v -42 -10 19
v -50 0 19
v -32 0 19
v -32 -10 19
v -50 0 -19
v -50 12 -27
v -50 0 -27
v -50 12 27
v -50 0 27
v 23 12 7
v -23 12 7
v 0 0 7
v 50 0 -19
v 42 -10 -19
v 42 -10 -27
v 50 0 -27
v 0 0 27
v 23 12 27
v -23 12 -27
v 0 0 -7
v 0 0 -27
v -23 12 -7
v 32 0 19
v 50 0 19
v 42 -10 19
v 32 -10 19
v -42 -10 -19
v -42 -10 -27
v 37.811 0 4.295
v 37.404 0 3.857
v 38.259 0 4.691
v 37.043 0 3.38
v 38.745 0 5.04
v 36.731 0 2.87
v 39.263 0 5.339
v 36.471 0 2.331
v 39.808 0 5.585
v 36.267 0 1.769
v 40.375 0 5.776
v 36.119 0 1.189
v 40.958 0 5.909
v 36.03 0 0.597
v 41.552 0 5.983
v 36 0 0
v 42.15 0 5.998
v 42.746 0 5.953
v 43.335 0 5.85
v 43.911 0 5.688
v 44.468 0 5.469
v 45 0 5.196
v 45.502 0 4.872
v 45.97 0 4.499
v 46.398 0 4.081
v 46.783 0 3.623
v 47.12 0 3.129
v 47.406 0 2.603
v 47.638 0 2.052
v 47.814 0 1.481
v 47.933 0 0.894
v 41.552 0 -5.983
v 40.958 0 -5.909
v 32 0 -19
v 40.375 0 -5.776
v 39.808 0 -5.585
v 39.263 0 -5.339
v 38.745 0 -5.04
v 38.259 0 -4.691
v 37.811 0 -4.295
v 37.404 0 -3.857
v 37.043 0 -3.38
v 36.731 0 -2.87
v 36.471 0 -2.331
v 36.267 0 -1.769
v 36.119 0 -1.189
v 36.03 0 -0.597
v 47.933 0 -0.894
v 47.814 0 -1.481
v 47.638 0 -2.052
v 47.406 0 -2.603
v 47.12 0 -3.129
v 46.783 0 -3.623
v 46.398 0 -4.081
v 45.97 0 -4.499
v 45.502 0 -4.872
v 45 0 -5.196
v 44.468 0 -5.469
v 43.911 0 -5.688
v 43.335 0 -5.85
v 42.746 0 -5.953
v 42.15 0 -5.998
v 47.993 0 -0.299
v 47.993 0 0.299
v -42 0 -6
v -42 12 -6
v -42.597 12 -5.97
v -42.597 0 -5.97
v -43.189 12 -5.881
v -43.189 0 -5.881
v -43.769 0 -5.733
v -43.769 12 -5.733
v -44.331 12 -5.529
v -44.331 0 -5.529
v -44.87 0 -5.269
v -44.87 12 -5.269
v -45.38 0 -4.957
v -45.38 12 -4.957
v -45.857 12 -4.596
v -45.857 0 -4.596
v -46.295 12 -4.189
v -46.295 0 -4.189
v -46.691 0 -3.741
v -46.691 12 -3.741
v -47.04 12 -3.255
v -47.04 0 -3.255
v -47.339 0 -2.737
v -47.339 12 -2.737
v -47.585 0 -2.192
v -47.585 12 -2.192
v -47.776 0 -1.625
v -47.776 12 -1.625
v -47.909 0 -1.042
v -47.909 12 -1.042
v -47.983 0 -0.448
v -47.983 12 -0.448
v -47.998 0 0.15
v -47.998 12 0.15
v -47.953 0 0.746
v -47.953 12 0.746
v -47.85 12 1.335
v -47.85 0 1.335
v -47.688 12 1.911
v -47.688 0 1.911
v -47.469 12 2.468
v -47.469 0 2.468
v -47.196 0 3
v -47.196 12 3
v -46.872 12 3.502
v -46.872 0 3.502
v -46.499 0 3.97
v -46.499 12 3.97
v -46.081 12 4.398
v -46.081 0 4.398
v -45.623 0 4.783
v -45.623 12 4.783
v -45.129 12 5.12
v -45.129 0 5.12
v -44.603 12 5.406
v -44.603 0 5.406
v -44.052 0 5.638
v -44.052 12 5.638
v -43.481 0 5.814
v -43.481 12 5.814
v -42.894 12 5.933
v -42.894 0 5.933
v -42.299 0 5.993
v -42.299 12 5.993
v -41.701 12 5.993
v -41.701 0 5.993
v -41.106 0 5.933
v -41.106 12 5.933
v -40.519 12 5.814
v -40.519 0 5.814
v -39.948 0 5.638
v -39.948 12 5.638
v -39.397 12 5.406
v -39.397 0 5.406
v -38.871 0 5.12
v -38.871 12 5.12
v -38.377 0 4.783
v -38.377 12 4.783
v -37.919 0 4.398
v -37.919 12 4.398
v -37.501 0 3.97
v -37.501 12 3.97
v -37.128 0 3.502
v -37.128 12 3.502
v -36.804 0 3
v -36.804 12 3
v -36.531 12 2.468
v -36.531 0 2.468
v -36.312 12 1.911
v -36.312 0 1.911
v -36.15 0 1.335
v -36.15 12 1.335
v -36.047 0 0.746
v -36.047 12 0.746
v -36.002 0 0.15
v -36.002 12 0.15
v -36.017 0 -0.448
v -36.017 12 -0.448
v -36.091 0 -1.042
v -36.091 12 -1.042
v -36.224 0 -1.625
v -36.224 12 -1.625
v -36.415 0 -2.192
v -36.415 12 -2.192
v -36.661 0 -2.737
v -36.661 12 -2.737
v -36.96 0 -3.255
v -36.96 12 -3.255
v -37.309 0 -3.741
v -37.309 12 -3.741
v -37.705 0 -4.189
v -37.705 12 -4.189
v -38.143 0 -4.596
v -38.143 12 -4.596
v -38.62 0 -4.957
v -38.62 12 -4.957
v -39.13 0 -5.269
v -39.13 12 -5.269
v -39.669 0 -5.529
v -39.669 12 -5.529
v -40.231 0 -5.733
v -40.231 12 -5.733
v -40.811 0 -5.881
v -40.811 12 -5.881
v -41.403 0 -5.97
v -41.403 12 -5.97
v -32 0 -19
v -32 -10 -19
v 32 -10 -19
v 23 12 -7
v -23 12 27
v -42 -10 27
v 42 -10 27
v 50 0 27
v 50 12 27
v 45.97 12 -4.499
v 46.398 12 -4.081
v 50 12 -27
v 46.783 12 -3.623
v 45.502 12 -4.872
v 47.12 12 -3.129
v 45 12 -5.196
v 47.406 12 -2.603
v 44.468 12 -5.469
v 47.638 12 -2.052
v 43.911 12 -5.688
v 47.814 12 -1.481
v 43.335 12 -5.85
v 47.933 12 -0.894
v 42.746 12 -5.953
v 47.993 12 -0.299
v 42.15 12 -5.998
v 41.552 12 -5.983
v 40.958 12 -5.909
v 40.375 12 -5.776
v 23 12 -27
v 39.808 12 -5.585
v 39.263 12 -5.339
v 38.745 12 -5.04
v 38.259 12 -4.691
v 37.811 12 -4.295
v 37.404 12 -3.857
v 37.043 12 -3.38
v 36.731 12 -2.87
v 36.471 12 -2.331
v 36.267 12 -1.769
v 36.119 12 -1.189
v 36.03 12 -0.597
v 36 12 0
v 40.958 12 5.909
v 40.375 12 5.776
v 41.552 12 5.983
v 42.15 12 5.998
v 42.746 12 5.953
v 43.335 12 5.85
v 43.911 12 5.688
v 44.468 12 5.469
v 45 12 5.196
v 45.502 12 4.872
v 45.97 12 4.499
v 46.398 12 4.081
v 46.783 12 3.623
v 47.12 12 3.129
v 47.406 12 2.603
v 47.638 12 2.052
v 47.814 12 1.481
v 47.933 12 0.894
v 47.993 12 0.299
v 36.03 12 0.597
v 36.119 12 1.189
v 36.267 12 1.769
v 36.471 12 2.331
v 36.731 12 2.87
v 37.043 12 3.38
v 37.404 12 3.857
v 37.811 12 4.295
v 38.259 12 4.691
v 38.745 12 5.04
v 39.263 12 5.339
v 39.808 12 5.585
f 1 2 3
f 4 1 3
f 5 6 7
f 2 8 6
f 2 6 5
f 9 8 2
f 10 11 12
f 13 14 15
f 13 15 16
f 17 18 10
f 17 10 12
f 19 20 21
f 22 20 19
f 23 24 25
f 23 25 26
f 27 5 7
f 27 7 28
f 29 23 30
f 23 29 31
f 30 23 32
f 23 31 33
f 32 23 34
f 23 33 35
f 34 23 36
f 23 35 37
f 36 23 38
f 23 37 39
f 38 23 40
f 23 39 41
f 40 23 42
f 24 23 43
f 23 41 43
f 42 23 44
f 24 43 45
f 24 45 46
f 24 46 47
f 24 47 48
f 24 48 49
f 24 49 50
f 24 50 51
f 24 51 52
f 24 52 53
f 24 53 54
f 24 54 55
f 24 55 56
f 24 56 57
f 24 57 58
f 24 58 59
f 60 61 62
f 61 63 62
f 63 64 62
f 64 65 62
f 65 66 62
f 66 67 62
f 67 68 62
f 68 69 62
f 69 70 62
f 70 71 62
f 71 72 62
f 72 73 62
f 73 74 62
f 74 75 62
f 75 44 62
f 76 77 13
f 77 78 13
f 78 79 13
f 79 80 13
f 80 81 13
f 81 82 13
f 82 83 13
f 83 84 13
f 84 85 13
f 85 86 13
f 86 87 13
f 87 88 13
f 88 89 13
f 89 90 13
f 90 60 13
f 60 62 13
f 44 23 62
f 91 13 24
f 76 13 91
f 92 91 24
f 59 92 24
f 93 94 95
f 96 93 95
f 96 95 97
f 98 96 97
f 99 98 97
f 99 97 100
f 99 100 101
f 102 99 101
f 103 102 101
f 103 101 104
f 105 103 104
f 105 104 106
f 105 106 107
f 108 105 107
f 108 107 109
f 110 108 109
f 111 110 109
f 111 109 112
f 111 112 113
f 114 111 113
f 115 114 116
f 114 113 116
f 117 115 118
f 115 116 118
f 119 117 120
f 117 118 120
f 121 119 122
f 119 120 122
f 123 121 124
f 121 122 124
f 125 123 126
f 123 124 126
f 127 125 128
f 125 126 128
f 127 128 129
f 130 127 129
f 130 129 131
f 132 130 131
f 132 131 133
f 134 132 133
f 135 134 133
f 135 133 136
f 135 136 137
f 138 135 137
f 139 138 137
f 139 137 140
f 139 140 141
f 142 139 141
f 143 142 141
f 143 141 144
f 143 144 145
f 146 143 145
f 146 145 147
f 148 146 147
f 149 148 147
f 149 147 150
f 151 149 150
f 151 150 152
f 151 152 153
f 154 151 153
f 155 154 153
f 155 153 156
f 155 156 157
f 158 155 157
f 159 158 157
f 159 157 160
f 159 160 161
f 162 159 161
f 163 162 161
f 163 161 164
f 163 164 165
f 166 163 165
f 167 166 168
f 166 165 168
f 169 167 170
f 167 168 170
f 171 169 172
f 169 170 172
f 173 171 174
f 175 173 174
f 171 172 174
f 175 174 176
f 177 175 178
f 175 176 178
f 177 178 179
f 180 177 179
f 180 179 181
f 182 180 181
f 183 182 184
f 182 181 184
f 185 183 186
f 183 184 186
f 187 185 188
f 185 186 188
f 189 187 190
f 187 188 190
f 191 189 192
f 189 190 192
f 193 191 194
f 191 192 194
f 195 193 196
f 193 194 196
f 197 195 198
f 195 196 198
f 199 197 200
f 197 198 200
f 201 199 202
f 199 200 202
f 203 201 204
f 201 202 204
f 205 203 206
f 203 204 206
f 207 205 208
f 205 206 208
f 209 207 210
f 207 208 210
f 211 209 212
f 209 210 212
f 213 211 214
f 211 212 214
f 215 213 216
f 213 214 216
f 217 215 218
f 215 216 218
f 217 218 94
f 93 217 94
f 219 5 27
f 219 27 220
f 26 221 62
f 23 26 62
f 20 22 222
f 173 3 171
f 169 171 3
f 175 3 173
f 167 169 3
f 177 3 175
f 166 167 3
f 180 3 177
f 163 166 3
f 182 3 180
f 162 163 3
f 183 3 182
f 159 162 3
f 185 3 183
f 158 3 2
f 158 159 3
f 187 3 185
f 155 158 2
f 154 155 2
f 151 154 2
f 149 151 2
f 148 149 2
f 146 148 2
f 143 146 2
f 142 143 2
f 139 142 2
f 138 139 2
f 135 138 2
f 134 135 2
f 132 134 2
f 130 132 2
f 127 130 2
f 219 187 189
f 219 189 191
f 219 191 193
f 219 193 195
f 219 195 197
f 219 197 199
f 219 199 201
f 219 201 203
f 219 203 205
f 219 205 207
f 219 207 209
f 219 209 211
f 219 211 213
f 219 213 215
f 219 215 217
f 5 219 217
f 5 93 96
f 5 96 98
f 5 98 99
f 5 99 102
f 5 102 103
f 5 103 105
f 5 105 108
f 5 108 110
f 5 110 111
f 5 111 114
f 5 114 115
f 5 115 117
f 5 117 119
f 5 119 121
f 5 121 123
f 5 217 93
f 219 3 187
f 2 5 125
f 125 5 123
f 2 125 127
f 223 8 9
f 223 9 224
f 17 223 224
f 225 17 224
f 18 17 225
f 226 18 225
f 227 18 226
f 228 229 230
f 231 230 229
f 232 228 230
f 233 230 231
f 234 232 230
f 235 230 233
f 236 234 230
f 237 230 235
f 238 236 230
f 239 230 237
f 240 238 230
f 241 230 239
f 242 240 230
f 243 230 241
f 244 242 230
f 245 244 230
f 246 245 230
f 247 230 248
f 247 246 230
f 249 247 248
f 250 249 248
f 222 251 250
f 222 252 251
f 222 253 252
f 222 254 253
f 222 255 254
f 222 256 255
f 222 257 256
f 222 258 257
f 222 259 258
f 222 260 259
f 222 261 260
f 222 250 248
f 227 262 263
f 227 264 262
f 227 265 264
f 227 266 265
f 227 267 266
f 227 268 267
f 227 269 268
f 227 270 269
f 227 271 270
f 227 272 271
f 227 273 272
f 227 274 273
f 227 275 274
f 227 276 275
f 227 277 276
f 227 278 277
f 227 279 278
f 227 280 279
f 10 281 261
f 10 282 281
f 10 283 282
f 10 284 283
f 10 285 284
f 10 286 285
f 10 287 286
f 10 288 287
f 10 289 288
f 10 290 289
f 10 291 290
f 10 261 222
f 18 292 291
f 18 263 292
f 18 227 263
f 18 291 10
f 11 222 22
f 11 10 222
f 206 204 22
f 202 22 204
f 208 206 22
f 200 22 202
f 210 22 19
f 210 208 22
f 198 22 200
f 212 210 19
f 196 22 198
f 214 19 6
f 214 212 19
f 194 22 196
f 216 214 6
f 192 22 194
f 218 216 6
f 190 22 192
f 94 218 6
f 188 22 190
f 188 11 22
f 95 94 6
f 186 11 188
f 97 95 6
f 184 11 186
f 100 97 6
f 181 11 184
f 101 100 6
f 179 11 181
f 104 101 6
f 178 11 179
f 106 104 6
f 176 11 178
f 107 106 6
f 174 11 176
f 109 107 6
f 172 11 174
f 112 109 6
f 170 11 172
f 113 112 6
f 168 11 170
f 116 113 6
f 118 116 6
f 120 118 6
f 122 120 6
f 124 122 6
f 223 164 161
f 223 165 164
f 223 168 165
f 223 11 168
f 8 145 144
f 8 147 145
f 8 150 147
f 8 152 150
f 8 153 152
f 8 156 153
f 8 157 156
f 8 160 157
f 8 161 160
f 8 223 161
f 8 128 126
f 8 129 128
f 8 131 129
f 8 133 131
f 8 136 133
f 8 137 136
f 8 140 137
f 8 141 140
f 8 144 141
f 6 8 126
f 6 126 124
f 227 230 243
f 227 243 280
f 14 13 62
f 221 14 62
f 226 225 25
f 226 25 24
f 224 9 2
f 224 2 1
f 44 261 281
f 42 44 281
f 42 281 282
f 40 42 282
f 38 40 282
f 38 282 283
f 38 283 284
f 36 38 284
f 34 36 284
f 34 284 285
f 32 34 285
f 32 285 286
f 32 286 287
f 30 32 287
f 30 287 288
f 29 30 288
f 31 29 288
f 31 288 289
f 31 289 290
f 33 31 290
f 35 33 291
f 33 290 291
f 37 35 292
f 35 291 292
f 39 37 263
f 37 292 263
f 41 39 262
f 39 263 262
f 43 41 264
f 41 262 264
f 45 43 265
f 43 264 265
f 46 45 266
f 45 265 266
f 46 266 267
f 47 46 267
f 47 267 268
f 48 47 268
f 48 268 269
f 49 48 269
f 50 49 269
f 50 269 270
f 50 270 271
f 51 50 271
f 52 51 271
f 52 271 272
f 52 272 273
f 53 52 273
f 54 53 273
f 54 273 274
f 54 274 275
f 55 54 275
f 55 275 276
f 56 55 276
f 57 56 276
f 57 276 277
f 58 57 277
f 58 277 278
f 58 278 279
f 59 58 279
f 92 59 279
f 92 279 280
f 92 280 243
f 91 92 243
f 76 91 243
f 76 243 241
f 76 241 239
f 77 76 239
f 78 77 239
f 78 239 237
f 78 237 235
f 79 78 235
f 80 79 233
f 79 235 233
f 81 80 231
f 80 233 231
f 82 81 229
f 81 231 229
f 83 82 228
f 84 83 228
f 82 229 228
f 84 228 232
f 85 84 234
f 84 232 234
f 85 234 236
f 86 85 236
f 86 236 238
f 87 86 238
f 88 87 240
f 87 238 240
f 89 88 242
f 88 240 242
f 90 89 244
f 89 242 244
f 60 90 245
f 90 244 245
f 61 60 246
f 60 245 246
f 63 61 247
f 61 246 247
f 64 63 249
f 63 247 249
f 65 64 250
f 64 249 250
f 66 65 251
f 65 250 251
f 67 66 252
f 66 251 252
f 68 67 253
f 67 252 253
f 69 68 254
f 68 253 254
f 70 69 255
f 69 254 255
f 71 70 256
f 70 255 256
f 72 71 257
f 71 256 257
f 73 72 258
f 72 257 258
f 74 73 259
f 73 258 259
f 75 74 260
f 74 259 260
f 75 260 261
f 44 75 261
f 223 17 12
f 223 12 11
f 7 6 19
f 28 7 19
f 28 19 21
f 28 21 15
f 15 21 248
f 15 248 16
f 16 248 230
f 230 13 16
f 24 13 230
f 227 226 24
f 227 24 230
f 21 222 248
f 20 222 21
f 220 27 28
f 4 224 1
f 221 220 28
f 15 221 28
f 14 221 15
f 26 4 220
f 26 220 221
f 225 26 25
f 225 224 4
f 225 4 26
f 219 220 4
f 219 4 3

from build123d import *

# Parameters (mm, degrees)
EXTRUDE_1_DEPTH       = 27
EXTRUDE_2_DEPTH       = 7
CUT_EXTRUDE_START     = -19
CUT_EXTRUDE_3_DEPTH   = 38
SKETCH_2_R            = 6
CUT_EXTRUDE_3_2_DEPTH = 61.934390946


# Read off the part's stored shape, not the designer's step: 切除-拉伸-薄壁3
with BuildPart() as part:
    # 草图1 → 凸台-拉伸1 (new, symmetric)
    with BuildSketch(Plane.XY):
        Polygon((23, 12), (0, 0), (-23, 12), (-50, 12), (-50, 0), (-32, 0), (-32, -10), (32, -10), (32, 0), (50, 0), (50, 12), align=None)
        Polygon((-32, 0), (-50, 0), (-42, -10), (-32, -10), align=None)
        Polygon((42, -10), (50, 0), (32, 0), (32, -10), align=None)
    extrude(amount=EXTRUDE_1_DEPTH, both=True)

    # 草图1<4> → 凸台-拉伸2 (add, symmetric)
    with BuildSketch(Plane.XY):
        Polygon((0, 12), (0, 0), (23, 12), align=None)
        Polygon((-23, 12), (0, 0), (0, 12), align=None)
    extrude(amount=EXTRUDE_2_DEPTH, both=True)

    # Cut-Extrude 3 outline → Cut-Extrude 3 (cut)
    with BuildSketch(Plane.XY.offset(CUT_EXTRUDE_START)):
        Polygon((-32, 0), (-50, 0), (-42, -10), (-32, -10), align=None)
    cut_extrude_3 = extrude(amount=CUT_EXTRUDE_3_DEPTH, mode=Mode.SUBTRACT)

    # 镜向1: Cut-Extrude 3 across plane
    add(cut_extrude_3.mirror(Plane(origin=(0, 0, 0), x_dir=(0, 0, 1), z_dir=(1, 0, 0))), mode=Mode.SUBTRACT)

    # 草图2 → Cut-Extrude 3 2 (cut, through all)
    with BuildSketch(Plane(origin=(0, 12, 0), x_dir=(1, 0, 0), z_dir=(0, 1, 0))):
        with Locations(Location((42, 0, 0), (0, 0, 180))):
            Circle(SKETCH_2_R)
        with Locations(Location((-42, 0, 0), (0, 0, 90))):
            Circle(SKETCH_2_R)
    extrude(amount=-CUT_EXTRUDE_3_2_DEPTH, mode=Mode.SUBTRACT)


solid = part.part
